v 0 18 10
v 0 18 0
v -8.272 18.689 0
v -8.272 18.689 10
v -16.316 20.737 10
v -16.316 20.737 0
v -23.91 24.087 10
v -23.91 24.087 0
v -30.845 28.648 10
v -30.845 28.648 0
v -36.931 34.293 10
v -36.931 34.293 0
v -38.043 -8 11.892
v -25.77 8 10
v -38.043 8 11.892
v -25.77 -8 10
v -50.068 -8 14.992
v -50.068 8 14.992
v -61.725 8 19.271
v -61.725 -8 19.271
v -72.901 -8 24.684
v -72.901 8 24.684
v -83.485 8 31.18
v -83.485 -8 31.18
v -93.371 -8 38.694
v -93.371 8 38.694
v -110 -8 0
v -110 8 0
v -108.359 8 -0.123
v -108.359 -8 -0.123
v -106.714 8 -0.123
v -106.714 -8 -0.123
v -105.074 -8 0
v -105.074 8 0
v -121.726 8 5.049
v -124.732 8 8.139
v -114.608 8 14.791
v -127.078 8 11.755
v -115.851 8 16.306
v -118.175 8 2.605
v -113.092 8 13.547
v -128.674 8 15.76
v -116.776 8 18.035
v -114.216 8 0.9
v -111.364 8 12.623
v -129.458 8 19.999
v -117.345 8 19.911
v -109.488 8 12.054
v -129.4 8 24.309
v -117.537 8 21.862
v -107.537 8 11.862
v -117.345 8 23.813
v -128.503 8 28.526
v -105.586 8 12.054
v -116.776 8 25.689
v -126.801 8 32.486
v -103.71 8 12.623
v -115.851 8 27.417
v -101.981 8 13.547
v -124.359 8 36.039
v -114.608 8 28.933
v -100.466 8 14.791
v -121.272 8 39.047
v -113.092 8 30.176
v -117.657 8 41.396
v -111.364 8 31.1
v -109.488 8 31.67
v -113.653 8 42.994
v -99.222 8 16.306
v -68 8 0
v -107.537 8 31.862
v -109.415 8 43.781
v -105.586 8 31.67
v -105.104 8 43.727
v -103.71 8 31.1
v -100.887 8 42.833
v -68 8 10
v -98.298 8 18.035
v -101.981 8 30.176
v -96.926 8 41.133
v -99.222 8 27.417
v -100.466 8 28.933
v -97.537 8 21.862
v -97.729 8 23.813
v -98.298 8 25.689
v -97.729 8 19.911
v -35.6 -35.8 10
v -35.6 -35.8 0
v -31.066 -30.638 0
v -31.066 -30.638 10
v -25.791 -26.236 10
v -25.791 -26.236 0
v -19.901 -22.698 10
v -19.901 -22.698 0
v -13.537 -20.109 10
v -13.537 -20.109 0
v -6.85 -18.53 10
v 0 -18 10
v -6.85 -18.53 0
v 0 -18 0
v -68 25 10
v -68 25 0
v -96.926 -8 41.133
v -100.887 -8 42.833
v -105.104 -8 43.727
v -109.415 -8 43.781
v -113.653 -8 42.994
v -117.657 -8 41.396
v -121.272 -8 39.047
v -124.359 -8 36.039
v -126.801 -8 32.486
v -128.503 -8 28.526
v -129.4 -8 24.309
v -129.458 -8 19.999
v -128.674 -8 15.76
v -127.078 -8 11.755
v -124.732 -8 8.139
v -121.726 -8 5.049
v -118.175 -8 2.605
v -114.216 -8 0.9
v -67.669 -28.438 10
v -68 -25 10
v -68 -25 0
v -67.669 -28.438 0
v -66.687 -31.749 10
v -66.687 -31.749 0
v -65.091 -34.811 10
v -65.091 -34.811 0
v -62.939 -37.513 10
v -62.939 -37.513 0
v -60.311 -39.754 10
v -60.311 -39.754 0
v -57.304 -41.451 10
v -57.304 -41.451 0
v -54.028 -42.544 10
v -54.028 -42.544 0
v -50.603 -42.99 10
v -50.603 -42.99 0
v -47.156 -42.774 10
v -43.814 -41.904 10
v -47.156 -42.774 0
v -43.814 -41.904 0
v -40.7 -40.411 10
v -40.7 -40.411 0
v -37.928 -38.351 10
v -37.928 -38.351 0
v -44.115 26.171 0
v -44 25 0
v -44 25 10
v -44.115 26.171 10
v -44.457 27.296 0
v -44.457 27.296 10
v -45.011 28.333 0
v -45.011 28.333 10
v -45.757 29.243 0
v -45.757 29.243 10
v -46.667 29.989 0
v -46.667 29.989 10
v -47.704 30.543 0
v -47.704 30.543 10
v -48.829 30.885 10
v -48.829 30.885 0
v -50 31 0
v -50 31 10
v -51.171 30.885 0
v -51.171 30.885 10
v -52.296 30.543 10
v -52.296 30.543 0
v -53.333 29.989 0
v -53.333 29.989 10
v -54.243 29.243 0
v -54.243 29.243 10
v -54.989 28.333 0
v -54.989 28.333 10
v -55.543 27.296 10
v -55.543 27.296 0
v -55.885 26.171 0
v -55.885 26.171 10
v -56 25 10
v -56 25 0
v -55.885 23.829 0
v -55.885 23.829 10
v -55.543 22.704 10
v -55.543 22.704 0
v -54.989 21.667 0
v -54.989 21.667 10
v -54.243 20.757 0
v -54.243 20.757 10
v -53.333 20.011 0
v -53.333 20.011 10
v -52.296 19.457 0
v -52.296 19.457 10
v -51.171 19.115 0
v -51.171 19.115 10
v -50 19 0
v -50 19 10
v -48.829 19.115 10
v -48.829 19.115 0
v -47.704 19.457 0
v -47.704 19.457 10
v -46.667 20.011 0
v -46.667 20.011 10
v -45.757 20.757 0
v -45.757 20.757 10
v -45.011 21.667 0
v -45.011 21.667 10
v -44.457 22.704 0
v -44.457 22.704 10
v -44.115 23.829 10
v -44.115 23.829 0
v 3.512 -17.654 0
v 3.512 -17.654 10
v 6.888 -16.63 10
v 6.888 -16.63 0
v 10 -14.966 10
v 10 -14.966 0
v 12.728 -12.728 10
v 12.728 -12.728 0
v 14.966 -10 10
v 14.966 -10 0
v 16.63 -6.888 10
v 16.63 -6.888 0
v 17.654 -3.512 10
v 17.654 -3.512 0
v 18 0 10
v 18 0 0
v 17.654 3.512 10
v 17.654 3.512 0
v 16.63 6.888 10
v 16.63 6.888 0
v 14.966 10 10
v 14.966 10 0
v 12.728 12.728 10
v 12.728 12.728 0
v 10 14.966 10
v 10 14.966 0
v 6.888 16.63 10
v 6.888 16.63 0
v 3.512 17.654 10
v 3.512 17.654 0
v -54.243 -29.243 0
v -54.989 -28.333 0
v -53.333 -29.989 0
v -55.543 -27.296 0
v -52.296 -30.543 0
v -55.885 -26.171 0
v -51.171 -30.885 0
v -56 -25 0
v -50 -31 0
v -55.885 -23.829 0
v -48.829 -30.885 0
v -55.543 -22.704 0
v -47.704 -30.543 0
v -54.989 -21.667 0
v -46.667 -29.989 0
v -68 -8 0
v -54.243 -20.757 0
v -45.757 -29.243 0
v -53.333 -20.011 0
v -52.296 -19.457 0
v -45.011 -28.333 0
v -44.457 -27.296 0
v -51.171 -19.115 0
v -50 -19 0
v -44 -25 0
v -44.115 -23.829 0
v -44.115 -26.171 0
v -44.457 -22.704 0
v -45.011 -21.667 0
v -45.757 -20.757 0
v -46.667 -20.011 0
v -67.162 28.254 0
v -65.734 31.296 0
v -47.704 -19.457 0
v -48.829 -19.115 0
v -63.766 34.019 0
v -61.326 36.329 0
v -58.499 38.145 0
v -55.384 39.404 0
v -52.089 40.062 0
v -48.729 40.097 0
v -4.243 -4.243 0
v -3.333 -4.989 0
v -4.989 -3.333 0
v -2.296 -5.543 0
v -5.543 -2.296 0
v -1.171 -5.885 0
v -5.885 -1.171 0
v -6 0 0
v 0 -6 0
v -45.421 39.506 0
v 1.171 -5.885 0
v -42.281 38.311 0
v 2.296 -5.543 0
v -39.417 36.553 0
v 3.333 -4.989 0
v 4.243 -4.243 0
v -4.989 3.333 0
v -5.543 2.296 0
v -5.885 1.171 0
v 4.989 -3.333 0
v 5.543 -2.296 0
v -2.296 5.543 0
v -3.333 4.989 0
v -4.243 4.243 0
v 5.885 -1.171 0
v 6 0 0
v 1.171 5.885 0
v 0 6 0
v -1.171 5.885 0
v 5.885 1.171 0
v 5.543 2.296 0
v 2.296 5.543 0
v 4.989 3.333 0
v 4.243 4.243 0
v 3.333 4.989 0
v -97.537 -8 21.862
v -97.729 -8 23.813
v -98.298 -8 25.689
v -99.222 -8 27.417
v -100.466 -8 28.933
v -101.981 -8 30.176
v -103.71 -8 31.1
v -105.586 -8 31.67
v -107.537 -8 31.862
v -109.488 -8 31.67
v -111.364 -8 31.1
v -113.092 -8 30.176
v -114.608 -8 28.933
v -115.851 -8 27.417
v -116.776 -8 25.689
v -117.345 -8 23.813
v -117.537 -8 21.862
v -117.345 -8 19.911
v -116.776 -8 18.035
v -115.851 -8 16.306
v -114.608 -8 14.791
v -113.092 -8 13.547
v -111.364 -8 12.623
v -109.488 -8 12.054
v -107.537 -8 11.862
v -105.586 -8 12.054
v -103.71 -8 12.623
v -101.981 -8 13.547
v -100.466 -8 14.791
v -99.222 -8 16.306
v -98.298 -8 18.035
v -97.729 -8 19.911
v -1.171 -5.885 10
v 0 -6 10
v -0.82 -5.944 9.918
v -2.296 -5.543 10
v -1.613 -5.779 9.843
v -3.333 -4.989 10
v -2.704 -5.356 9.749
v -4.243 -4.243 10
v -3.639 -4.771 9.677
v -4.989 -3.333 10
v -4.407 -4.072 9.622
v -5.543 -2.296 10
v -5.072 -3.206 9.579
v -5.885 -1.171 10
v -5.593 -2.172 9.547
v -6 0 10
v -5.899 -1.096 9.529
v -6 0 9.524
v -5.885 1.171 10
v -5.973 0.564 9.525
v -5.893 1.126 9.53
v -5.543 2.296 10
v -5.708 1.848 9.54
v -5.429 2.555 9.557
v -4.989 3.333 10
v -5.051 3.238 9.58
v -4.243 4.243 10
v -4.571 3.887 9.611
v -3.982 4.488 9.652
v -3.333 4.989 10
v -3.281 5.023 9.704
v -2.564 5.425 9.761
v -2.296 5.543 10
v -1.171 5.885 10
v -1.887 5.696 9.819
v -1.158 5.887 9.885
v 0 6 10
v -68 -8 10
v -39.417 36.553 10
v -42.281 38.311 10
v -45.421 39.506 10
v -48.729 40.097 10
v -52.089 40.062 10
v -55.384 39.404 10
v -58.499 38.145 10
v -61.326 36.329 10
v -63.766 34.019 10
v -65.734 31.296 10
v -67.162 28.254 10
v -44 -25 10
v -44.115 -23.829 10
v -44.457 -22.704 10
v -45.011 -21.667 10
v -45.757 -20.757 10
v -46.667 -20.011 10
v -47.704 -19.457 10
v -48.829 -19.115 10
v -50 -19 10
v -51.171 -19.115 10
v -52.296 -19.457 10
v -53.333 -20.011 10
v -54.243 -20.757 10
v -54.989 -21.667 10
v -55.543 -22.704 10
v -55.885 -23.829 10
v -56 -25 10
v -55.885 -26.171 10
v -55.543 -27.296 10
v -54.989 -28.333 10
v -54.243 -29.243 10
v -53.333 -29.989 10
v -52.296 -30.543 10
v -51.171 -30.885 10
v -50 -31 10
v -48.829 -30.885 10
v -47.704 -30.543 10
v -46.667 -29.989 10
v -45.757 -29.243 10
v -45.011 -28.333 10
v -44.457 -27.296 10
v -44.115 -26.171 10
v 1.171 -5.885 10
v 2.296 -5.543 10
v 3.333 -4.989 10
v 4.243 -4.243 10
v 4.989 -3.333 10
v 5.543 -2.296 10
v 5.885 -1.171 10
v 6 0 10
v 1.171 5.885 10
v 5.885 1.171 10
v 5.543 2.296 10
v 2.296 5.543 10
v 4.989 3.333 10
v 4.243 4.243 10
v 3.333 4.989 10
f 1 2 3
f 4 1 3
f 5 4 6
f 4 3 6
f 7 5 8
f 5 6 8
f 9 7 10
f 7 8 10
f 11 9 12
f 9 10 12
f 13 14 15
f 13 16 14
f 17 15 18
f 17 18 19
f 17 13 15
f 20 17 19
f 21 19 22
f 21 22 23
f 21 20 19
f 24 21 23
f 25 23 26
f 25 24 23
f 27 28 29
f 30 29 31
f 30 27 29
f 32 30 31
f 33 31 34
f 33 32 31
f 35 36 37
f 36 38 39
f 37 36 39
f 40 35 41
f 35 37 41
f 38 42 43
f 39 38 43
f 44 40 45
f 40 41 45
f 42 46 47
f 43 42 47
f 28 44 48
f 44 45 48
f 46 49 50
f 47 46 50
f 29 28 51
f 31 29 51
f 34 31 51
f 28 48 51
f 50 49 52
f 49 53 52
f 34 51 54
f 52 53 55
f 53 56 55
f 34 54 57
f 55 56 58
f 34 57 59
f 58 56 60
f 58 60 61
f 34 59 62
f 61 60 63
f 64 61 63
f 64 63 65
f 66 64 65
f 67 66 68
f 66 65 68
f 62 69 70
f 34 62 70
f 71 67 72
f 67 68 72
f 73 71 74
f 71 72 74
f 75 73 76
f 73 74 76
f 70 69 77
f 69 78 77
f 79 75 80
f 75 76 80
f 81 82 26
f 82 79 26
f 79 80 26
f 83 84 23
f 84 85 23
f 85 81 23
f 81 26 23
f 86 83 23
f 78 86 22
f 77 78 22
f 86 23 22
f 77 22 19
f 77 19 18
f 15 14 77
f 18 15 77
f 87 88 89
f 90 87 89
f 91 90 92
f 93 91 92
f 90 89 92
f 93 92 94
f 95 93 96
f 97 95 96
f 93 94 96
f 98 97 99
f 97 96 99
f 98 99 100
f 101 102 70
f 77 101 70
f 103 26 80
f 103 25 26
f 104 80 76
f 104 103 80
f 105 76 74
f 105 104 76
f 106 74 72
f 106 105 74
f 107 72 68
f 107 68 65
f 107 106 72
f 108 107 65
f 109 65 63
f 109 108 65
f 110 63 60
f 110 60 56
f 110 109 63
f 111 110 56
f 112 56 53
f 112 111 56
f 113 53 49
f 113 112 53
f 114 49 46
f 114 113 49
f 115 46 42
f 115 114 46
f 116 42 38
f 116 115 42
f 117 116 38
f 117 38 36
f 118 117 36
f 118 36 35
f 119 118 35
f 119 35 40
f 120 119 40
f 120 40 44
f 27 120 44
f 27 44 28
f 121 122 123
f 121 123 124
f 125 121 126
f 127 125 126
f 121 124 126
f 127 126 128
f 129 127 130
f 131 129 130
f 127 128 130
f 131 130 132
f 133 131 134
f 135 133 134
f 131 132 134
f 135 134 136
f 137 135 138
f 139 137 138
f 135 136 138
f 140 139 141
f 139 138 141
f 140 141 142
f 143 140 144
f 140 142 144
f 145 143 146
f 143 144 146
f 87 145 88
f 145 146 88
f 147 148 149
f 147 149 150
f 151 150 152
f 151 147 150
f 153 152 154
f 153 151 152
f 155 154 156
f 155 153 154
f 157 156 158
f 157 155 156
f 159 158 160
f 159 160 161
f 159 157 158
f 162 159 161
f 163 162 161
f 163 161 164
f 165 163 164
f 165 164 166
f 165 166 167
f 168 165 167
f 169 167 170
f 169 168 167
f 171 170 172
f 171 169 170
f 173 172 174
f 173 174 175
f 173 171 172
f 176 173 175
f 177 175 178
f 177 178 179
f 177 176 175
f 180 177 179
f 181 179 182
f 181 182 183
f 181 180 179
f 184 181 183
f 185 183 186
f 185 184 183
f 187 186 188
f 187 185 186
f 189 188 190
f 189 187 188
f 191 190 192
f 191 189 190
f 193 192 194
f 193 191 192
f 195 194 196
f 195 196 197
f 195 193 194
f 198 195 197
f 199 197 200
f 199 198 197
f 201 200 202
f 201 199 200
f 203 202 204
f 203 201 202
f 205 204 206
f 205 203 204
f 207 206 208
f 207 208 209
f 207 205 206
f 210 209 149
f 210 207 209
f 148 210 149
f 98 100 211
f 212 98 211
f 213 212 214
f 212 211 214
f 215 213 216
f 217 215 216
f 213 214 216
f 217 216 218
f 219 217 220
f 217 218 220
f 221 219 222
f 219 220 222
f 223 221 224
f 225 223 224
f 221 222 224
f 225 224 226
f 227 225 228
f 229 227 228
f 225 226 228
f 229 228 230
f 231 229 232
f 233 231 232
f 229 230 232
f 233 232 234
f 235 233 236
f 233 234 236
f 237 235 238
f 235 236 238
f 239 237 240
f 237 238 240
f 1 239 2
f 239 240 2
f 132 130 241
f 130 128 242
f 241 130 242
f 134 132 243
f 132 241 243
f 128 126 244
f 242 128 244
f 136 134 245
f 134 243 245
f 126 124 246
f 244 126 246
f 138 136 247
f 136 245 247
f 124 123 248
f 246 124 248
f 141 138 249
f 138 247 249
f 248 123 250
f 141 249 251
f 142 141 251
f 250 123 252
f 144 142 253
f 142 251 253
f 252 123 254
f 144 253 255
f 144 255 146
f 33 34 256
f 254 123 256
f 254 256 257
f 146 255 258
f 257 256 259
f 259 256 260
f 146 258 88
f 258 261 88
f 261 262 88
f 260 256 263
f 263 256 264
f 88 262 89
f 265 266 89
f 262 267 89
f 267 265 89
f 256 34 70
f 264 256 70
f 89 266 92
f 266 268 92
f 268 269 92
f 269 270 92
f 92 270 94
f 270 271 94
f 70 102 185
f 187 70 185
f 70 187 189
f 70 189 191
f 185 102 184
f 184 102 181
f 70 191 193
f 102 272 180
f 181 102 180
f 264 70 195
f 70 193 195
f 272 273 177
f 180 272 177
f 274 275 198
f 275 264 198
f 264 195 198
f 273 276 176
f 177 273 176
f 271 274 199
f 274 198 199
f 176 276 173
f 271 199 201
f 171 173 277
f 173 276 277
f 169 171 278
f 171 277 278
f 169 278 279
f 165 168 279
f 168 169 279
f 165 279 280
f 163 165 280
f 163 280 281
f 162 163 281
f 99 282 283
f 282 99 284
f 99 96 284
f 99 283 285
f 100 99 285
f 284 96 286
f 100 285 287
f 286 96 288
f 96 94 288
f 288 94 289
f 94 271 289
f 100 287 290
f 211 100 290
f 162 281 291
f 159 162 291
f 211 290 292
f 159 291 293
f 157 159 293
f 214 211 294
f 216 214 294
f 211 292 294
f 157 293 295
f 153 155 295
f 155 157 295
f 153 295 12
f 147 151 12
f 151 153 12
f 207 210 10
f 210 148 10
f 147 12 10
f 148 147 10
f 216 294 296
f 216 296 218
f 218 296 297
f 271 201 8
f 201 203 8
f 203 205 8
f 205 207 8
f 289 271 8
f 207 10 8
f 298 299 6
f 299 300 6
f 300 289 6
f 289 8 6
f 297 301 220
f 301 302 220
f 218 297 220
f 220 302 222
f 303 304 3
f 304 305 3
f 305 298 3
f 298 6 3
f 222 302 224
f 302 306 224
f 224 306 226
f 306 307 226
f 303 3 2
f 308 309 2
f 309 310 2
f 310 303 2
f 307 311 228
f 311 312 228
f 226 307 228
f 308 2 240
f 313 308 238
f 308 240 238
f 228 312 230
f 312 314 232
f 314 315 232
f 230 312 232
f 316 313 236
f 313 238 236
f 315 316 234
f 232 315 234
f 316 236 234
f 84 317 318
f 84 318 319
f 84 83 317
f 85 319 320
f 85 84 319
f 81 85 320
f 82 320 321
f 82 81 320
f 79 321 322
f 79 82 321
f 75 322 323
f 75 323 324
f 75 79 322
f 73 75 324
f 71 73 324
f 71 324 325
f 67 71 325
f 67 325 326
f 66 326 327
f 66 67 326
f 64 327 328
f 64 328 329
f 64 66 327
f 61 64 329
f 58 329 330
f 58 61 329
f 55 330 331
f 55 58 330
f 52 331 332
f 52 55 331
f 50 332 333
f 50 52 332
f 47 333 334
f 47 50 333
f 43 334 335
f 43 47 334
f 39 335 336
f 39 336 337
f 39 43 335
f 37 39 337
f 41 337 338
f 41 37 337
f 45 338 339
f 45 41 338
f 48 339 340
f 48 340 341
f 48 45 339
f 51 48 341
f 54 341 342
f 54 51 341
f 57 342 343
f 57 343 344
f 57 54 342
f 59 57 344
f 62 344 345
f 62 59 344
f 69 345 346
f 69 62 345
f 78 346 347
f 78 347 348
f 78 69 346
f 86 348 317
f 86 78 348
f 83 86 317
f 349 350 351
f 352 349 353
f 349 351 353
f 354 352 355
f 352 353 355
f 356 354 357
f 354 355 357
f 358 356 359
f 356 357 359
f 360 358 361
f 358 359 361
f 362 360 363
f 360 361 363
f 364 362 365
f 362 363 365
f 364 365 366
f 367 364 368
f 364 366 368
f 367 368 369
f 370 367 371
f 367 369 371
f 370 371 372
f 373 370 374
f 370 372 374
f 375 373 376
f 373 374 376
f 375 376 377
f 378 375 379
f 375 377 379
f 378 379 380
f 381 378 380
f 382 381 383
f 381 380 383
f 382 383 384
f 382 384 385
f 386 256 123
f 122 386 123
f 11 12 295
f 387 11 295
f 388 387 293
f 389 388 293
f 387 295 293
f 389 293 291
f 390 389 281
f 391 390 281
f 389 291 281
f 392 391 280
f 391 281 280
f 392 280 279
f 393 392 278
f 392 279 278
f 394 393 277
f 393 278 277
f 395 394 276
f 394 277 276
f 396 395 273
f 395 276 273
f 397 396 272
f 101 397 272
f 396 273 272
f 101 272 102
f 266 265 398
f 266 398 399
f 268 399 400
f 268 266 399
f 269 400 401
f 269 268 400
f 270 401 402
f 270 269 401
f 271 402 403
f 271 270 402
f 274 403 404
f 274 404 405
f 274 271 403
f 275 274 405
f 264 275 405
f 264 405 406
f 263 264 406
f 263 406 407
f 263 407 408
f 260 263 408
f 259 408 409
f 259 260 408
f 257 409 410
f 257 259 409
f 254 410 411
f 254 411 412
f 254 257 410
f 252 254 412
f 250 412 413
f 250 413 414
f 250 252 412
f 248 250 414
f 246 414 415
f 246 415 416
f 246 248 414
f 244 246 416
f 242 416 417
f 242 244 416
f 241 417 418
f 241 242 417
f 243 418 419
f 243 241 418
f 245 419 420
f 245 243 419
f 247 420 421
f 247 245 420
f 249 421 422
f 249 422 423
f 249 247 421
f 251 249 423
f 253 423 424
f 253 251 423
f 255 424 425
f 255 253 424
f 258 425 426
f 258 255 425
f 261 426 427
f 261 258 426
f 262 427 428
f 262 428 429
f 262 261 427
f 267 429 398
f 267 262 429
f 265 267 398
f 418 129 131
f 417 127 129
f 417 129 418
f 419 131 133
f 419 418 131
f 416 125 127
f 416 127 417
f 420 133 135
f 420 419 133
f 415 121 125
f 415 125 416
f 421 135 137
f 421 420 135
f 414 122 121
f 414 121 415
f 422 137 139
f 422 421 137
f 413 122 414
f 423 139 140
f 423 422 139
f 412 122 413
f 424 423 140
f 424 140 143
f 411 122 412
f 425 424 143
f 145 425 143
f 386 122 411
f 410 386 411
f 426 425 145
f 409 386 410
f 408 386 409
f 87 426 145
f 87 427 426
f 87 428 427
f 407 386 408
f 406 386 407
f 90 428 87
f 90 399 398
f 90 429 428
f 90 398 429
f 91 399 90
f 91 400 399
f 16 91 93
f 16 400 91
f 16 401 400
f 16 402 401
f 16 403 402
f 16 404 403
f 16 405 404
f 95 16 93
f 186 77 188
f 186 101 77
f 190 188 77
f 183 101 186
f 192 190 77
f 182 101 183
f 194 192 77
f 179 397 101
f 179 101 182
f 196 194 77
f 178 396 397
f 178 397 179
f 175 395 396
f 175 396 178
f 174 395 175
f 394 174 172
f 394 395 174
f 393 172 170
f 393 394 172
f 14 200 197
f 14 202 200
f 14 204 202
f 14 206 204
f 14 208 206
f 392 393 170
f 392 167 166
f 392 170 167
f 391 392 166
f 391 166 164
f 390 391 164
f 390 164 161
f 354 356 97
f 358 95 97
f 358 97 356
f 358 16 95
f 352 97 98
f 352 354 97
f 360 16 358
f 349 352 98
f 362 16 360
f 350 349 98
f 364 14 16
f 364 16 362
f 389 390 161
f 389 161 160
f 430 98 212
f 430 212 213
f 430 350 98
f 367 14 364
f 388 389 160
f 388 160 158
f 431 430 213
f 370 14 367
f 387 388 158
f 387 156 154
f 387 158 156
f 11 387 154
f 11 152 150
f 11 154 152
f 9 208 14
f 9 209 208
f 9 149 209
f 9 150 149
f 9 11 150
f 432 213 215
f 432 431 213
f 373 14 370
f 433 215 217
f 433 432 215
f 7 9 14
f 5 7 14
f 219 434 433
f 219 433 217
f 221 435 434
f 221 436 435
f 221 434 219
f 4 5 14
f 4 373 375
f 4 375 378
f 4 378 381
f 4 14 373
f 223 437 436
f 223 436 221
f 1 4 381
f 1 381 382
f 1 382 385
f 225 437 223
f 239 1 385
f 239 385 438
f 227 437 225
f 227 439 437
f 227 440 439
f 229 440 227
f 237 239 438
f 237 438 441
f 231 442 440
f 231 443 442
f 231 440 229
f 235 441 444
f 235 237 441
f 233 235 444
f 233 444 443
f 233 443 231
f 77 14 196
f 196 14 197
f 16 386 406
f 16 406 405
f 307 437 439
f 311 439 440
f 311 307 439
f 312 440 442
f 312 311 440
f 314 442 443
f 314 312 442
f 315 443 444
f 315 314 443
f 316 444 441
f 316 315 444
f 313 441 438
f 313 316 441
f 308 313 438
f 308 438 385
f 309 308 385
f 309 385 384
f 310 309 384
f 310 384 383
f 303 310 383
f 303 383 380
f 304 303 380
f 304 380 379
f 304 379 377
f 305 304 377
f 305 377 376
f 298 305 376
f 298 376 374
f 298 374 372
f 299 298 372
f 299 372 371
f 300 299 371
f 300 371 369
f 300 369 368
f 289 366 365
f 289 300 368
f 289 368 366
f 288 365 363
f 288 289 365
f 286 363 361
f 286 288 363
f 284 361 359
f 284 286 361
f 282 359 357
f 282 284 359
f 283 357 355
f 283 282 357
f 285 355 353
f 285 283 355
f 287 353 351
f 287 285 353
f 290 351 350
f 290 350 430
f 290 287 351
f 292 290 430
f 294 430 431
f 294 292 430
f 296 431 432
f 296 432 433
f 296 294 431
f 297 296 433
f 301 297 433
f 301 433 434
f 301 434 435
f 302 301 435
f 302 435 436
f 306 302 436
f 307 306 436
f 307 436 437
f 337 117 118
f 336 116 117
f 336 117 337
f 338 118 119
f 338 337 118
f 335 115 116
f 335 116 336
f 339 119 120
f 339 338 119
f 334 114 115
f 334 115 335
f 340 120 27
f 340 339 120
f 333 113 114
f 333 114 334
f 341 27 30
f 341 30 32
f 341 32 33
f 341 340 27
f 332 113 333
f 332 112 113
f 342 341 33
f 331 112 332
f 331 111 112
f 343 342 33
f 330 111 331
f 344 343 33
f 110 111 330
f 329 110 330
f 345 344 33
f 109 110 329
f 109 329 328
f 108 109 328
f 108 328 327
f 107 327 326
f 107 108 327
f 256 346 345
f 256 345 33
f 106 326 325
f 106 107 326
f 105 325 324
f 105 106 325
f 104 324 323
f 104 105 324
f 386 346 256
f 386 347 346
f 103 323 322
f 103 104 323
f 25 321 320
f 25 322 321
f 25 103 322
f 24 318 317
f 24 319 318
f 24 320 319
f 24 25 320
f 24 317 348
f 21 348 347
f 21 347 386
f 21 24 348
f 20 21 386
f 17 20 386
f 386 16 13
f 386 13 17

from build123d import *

# Parameters (mm, degrees)
F0_R          = 6
F1_DEPTH      = 10
F2_R          = 10
F3_DEPTH      = 8
F3_DEPTH_BACK = 8
F4_R          = 6
F5_DEPTH      = 25


with BuildPart() as f1:
    # F0 (on Top) → F1 (new body)
    with BuildSketch(Plane.XY):
        with BuildLine():
            ThreePointArc((-35.6, -35.8), (-19.901005, -22.69799), (0, -18))
            ThreePointArc((0, -18), (18, 0), (0, 18))
            ThreePointArc((0, 18), (-20.182572, 22.254358), (-36.930589, 34.293449))
            ThreePointArc((-36.930589, 34.293449), (-55.383923, 39.40414), (-68, 25))
            Line((-68, 25), (-68, -25))
            ThreePointArc((-68, -25), (-55.6921, -42.076299), (-35.6, -35.8))
        make_face()
        with Locations((-50, -25)):
            Circle(F0_R, mode=Mode.SUBTRACT)
        with Locations((-50, 25)):
            Circle(F0_R, mode=Mode.SUBTRACT)
        Circle(F0_R, mode=Mode.SUBTRACT)
    extrude(amount=F1_DEPTH)

    # F2 (on Front) → F3 (join, two sides)
    with BuildSketch(Plane.XZ) as f3_sk:
        with BuildLine():
            Line((-105.07352, 0), (-6, 0))
            Line((-6, 0), (-6, 9.523888))
            ThreePointArc((-6, 9.523888), (-15.894485, 9.37036), (-25.770109, 10))
            ThreePointArc((-25.770109, 10), (-61.725464, 19.270605), (-93.371199, 38.69428))
            ThreePointArc((-93.371199, 38.69428), (-127.749328, 30.547983), (-110, 0))
            Line((-110, 0), (-105.07352, 0))
        make_face()
        with Locations((-107.53676, 21.861666)):
            Circle(F2_R, mode=Mode.SUBTRACT)
        with BuildLine():
            ThreePointArc((-25.770109, 10), (-15.894485, 9.37036), (-6, 9.523888))
            Line((-6, 9.523888), (-6, 10))
            Line((-6, 10), (-25.770109, 10))
        make_face()
        with BuildLine():
            Line((-6, 10), (-6, 9.523888))
            ThreePointArc((-6, 9.523888), (-2.997134, 9.725826), (0, 10))
            Line((0, 10), (-6, 10))
        make_face()
        with BuildLine():
            ThreePointArc((-110, 0), (-107.53676, -0.138334), (-105.07352, 0))
            Line((-105.07352, 0), (-110, 0))
        make_face()
    extrude(amount=F3_DEPTH)
    extrude(f3_sk.sketch, amount=-F3_DEPTH_BACK)

    # F4 (on face) → F5 (cut)
    with BuildSketch(Plane(origin=(0, 0, 0), x_dir=(1, 0, 0), z_dir=(0, 0, -1))):
        Circle(F4_R)
    extrude(amount=-F5_DEPTH, mode=Mode.SUBTRACT)


solid = f1.part
